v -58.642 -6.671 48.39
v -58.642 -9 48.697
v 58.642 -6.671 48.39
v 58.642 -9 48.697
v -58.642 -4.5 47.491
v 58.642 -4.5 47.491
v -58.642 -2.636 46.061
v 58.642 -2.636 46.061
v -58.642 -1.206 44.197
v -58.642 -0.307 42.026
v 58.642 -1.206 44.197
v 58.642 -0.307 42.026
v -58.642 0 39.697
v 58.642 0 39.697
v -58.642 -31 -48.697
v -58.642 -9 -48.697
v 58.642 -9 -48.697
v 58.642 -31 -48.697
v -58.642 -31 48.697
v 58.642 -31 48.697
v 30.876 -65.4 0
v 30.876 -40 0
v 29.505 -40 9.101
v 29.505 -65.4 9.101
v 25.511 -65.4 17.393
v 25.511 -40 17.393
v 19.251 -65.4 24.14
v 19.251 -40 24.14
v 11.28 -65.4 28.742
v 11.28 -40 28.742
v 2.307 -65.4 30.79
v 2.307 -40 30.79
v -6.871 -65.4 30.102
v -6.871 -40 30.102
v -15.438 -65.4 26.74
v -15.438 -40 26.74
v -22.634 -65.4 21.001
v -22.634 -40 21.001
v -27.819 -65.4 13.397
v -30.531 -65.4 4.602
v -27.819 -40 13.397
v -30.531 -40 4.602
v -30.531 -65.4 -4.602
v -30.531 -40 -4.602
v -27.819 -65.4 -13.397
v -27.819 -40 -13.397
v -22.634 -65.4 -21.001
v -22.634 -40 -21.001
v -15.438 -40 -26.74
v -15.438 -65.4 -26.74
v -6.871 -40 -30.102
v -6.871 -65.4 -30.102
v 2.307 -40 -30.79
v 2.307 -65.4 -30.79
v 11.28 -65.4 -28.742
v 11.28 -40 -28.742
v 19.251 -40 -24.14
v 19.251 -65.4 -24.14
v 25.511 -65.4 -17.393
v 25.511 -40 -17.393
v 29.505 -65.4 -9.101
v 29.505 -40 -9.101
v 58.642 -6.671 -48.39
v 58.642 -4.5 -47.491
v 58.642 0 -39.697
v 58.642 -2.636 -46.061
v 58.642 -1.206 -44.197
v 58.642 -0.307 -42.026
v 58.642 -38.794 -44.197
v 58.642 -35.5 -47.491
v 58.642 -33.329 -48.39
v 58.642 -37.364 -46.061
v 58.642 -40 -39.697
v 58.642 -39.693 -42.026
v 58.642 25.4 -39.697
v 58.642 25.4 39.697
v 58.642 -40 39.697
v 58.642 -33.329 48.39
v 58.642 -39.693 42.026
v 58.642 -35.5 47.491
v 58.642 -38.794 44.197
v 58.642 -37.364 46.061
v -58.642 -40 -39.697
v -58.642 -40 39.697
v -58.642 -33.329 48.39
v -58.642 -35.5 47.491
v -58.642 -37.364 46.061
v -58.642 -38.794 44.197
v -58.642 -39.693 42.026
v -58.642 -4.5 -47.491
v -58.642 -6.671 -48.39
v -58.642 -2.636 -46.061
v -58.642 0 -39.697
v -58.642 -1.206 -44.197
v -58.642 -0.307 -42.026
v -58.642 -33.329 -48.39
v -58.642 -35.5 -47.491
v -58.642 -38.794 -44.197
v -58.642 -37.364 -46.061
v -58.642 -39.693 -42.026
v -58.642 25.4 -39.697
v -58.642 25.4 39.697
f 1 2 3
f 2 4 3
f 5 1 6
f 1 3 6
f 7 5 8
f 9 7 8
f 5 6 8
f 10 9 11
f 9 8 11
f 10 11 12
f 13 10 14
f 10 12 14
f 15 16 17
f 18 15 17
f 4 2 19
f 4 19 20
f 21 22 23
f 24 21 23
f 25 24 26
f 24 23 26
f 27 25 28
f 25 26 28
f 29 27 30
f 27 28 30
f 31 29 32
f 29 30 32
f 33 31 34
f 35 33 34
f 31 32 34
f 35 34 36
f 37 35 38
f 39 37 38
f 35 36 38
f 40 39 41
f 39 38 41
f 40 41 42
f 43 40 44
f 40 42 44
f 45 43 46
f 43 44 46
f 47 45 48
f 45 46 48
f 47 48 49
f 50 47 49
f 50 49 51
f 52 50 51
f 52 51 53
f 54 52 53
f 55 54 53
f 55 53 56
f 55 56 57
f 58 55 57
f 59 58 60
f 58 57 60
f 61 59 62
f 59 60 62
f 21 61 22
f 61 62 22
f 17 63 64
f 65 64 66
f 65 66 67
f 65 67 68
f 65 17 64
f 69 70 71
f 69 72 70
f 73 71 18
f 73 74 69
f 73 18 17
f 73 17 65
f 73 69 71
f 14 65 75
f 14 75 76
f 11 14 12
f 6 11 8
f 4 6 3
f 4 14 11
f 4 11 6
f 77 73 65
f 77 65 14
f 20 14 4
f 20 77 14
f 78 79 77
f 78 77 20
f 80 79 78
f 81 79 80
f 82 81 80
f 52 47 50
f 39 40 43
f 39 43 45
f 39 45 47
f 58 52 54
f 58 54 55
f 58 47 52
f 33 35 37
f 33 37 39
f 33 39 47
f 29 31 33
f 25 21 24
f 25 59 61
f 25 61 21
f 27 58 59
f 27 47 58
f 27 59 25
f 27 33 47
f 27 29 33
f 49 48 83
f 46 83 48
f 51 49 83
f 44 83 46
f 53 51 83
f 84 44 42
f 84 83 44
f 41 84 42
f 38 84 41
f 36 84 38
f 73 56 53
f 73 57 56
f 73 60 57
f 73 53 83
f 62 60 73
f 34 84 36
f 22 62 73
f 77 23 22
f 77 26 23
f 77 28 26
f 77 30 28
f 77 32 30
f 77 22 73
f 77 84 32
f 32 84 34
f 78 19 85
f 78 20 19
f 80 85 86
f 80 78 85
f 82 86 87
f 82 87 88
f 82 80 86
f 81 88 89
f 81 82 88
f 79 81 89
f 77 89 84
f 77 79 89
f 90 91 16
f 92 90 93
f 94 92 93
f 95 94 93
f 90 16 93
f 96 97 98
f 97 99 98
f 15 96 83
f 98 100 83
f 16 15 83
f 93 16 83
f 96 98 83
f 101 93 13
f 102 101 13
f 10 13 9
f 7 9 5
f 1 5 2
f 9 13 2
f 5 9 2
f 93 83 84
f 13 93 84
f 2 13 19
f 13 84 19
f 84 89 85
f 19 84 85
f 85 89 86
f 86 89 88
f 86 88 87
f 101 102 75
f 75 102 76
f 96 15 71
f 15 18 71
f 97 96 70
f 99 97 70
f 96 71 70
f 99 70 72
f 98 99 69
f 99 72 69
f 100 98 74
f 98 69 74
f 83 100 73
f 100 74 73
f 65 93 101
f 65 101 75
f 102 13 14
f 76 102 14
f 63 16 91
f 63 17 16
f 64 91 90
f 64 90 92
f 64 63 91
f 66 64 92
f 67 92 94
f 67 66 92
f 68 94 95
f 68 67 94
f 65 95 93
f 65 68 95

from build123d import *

# Parameters (mm, degrees)
F0_W     = 117.2845363617
F0_H     = 97.3939225078
F1_DEPTH = 40
F2_R     = 9
F4_R     = 30.8763163617
F5_DEPTH = 25.4
F6_DEPTH = 25.4


with BuildPart() as f1:
    # F0 (on Front) → F1 (new body)
    with BuildSketch(Plane.XZ):
        Rectangle(F0_W, F0_H)
    extrude(amount=F1_DEPTH)

    # F2
    f2_edges = [f1.edges().sort_by_distance(p)[0] for p in [
        (0, 0, 48.696961),
        (0, -40, 48.696961),
        (0, -40, -48.696961),
        (0, 0, -48.696961),
    ]]
    fillet(f2_edges, radius=F2_R)

    # F4 (on face) → F5 (join)
    with BuildSketch(Plane.XZ.offset(40)):
        Circle(F4_R)
    extrude(amount=F5_DEPTH)

    # F6 (add): a face of the model
    f6_faces = [f1.faces().sort_by_distance(p)[0] for p in [
        (0, 0, 0),
    ]]
    extrude(f6_faces, amount=F6_DEPTH)


solid = f1.part
